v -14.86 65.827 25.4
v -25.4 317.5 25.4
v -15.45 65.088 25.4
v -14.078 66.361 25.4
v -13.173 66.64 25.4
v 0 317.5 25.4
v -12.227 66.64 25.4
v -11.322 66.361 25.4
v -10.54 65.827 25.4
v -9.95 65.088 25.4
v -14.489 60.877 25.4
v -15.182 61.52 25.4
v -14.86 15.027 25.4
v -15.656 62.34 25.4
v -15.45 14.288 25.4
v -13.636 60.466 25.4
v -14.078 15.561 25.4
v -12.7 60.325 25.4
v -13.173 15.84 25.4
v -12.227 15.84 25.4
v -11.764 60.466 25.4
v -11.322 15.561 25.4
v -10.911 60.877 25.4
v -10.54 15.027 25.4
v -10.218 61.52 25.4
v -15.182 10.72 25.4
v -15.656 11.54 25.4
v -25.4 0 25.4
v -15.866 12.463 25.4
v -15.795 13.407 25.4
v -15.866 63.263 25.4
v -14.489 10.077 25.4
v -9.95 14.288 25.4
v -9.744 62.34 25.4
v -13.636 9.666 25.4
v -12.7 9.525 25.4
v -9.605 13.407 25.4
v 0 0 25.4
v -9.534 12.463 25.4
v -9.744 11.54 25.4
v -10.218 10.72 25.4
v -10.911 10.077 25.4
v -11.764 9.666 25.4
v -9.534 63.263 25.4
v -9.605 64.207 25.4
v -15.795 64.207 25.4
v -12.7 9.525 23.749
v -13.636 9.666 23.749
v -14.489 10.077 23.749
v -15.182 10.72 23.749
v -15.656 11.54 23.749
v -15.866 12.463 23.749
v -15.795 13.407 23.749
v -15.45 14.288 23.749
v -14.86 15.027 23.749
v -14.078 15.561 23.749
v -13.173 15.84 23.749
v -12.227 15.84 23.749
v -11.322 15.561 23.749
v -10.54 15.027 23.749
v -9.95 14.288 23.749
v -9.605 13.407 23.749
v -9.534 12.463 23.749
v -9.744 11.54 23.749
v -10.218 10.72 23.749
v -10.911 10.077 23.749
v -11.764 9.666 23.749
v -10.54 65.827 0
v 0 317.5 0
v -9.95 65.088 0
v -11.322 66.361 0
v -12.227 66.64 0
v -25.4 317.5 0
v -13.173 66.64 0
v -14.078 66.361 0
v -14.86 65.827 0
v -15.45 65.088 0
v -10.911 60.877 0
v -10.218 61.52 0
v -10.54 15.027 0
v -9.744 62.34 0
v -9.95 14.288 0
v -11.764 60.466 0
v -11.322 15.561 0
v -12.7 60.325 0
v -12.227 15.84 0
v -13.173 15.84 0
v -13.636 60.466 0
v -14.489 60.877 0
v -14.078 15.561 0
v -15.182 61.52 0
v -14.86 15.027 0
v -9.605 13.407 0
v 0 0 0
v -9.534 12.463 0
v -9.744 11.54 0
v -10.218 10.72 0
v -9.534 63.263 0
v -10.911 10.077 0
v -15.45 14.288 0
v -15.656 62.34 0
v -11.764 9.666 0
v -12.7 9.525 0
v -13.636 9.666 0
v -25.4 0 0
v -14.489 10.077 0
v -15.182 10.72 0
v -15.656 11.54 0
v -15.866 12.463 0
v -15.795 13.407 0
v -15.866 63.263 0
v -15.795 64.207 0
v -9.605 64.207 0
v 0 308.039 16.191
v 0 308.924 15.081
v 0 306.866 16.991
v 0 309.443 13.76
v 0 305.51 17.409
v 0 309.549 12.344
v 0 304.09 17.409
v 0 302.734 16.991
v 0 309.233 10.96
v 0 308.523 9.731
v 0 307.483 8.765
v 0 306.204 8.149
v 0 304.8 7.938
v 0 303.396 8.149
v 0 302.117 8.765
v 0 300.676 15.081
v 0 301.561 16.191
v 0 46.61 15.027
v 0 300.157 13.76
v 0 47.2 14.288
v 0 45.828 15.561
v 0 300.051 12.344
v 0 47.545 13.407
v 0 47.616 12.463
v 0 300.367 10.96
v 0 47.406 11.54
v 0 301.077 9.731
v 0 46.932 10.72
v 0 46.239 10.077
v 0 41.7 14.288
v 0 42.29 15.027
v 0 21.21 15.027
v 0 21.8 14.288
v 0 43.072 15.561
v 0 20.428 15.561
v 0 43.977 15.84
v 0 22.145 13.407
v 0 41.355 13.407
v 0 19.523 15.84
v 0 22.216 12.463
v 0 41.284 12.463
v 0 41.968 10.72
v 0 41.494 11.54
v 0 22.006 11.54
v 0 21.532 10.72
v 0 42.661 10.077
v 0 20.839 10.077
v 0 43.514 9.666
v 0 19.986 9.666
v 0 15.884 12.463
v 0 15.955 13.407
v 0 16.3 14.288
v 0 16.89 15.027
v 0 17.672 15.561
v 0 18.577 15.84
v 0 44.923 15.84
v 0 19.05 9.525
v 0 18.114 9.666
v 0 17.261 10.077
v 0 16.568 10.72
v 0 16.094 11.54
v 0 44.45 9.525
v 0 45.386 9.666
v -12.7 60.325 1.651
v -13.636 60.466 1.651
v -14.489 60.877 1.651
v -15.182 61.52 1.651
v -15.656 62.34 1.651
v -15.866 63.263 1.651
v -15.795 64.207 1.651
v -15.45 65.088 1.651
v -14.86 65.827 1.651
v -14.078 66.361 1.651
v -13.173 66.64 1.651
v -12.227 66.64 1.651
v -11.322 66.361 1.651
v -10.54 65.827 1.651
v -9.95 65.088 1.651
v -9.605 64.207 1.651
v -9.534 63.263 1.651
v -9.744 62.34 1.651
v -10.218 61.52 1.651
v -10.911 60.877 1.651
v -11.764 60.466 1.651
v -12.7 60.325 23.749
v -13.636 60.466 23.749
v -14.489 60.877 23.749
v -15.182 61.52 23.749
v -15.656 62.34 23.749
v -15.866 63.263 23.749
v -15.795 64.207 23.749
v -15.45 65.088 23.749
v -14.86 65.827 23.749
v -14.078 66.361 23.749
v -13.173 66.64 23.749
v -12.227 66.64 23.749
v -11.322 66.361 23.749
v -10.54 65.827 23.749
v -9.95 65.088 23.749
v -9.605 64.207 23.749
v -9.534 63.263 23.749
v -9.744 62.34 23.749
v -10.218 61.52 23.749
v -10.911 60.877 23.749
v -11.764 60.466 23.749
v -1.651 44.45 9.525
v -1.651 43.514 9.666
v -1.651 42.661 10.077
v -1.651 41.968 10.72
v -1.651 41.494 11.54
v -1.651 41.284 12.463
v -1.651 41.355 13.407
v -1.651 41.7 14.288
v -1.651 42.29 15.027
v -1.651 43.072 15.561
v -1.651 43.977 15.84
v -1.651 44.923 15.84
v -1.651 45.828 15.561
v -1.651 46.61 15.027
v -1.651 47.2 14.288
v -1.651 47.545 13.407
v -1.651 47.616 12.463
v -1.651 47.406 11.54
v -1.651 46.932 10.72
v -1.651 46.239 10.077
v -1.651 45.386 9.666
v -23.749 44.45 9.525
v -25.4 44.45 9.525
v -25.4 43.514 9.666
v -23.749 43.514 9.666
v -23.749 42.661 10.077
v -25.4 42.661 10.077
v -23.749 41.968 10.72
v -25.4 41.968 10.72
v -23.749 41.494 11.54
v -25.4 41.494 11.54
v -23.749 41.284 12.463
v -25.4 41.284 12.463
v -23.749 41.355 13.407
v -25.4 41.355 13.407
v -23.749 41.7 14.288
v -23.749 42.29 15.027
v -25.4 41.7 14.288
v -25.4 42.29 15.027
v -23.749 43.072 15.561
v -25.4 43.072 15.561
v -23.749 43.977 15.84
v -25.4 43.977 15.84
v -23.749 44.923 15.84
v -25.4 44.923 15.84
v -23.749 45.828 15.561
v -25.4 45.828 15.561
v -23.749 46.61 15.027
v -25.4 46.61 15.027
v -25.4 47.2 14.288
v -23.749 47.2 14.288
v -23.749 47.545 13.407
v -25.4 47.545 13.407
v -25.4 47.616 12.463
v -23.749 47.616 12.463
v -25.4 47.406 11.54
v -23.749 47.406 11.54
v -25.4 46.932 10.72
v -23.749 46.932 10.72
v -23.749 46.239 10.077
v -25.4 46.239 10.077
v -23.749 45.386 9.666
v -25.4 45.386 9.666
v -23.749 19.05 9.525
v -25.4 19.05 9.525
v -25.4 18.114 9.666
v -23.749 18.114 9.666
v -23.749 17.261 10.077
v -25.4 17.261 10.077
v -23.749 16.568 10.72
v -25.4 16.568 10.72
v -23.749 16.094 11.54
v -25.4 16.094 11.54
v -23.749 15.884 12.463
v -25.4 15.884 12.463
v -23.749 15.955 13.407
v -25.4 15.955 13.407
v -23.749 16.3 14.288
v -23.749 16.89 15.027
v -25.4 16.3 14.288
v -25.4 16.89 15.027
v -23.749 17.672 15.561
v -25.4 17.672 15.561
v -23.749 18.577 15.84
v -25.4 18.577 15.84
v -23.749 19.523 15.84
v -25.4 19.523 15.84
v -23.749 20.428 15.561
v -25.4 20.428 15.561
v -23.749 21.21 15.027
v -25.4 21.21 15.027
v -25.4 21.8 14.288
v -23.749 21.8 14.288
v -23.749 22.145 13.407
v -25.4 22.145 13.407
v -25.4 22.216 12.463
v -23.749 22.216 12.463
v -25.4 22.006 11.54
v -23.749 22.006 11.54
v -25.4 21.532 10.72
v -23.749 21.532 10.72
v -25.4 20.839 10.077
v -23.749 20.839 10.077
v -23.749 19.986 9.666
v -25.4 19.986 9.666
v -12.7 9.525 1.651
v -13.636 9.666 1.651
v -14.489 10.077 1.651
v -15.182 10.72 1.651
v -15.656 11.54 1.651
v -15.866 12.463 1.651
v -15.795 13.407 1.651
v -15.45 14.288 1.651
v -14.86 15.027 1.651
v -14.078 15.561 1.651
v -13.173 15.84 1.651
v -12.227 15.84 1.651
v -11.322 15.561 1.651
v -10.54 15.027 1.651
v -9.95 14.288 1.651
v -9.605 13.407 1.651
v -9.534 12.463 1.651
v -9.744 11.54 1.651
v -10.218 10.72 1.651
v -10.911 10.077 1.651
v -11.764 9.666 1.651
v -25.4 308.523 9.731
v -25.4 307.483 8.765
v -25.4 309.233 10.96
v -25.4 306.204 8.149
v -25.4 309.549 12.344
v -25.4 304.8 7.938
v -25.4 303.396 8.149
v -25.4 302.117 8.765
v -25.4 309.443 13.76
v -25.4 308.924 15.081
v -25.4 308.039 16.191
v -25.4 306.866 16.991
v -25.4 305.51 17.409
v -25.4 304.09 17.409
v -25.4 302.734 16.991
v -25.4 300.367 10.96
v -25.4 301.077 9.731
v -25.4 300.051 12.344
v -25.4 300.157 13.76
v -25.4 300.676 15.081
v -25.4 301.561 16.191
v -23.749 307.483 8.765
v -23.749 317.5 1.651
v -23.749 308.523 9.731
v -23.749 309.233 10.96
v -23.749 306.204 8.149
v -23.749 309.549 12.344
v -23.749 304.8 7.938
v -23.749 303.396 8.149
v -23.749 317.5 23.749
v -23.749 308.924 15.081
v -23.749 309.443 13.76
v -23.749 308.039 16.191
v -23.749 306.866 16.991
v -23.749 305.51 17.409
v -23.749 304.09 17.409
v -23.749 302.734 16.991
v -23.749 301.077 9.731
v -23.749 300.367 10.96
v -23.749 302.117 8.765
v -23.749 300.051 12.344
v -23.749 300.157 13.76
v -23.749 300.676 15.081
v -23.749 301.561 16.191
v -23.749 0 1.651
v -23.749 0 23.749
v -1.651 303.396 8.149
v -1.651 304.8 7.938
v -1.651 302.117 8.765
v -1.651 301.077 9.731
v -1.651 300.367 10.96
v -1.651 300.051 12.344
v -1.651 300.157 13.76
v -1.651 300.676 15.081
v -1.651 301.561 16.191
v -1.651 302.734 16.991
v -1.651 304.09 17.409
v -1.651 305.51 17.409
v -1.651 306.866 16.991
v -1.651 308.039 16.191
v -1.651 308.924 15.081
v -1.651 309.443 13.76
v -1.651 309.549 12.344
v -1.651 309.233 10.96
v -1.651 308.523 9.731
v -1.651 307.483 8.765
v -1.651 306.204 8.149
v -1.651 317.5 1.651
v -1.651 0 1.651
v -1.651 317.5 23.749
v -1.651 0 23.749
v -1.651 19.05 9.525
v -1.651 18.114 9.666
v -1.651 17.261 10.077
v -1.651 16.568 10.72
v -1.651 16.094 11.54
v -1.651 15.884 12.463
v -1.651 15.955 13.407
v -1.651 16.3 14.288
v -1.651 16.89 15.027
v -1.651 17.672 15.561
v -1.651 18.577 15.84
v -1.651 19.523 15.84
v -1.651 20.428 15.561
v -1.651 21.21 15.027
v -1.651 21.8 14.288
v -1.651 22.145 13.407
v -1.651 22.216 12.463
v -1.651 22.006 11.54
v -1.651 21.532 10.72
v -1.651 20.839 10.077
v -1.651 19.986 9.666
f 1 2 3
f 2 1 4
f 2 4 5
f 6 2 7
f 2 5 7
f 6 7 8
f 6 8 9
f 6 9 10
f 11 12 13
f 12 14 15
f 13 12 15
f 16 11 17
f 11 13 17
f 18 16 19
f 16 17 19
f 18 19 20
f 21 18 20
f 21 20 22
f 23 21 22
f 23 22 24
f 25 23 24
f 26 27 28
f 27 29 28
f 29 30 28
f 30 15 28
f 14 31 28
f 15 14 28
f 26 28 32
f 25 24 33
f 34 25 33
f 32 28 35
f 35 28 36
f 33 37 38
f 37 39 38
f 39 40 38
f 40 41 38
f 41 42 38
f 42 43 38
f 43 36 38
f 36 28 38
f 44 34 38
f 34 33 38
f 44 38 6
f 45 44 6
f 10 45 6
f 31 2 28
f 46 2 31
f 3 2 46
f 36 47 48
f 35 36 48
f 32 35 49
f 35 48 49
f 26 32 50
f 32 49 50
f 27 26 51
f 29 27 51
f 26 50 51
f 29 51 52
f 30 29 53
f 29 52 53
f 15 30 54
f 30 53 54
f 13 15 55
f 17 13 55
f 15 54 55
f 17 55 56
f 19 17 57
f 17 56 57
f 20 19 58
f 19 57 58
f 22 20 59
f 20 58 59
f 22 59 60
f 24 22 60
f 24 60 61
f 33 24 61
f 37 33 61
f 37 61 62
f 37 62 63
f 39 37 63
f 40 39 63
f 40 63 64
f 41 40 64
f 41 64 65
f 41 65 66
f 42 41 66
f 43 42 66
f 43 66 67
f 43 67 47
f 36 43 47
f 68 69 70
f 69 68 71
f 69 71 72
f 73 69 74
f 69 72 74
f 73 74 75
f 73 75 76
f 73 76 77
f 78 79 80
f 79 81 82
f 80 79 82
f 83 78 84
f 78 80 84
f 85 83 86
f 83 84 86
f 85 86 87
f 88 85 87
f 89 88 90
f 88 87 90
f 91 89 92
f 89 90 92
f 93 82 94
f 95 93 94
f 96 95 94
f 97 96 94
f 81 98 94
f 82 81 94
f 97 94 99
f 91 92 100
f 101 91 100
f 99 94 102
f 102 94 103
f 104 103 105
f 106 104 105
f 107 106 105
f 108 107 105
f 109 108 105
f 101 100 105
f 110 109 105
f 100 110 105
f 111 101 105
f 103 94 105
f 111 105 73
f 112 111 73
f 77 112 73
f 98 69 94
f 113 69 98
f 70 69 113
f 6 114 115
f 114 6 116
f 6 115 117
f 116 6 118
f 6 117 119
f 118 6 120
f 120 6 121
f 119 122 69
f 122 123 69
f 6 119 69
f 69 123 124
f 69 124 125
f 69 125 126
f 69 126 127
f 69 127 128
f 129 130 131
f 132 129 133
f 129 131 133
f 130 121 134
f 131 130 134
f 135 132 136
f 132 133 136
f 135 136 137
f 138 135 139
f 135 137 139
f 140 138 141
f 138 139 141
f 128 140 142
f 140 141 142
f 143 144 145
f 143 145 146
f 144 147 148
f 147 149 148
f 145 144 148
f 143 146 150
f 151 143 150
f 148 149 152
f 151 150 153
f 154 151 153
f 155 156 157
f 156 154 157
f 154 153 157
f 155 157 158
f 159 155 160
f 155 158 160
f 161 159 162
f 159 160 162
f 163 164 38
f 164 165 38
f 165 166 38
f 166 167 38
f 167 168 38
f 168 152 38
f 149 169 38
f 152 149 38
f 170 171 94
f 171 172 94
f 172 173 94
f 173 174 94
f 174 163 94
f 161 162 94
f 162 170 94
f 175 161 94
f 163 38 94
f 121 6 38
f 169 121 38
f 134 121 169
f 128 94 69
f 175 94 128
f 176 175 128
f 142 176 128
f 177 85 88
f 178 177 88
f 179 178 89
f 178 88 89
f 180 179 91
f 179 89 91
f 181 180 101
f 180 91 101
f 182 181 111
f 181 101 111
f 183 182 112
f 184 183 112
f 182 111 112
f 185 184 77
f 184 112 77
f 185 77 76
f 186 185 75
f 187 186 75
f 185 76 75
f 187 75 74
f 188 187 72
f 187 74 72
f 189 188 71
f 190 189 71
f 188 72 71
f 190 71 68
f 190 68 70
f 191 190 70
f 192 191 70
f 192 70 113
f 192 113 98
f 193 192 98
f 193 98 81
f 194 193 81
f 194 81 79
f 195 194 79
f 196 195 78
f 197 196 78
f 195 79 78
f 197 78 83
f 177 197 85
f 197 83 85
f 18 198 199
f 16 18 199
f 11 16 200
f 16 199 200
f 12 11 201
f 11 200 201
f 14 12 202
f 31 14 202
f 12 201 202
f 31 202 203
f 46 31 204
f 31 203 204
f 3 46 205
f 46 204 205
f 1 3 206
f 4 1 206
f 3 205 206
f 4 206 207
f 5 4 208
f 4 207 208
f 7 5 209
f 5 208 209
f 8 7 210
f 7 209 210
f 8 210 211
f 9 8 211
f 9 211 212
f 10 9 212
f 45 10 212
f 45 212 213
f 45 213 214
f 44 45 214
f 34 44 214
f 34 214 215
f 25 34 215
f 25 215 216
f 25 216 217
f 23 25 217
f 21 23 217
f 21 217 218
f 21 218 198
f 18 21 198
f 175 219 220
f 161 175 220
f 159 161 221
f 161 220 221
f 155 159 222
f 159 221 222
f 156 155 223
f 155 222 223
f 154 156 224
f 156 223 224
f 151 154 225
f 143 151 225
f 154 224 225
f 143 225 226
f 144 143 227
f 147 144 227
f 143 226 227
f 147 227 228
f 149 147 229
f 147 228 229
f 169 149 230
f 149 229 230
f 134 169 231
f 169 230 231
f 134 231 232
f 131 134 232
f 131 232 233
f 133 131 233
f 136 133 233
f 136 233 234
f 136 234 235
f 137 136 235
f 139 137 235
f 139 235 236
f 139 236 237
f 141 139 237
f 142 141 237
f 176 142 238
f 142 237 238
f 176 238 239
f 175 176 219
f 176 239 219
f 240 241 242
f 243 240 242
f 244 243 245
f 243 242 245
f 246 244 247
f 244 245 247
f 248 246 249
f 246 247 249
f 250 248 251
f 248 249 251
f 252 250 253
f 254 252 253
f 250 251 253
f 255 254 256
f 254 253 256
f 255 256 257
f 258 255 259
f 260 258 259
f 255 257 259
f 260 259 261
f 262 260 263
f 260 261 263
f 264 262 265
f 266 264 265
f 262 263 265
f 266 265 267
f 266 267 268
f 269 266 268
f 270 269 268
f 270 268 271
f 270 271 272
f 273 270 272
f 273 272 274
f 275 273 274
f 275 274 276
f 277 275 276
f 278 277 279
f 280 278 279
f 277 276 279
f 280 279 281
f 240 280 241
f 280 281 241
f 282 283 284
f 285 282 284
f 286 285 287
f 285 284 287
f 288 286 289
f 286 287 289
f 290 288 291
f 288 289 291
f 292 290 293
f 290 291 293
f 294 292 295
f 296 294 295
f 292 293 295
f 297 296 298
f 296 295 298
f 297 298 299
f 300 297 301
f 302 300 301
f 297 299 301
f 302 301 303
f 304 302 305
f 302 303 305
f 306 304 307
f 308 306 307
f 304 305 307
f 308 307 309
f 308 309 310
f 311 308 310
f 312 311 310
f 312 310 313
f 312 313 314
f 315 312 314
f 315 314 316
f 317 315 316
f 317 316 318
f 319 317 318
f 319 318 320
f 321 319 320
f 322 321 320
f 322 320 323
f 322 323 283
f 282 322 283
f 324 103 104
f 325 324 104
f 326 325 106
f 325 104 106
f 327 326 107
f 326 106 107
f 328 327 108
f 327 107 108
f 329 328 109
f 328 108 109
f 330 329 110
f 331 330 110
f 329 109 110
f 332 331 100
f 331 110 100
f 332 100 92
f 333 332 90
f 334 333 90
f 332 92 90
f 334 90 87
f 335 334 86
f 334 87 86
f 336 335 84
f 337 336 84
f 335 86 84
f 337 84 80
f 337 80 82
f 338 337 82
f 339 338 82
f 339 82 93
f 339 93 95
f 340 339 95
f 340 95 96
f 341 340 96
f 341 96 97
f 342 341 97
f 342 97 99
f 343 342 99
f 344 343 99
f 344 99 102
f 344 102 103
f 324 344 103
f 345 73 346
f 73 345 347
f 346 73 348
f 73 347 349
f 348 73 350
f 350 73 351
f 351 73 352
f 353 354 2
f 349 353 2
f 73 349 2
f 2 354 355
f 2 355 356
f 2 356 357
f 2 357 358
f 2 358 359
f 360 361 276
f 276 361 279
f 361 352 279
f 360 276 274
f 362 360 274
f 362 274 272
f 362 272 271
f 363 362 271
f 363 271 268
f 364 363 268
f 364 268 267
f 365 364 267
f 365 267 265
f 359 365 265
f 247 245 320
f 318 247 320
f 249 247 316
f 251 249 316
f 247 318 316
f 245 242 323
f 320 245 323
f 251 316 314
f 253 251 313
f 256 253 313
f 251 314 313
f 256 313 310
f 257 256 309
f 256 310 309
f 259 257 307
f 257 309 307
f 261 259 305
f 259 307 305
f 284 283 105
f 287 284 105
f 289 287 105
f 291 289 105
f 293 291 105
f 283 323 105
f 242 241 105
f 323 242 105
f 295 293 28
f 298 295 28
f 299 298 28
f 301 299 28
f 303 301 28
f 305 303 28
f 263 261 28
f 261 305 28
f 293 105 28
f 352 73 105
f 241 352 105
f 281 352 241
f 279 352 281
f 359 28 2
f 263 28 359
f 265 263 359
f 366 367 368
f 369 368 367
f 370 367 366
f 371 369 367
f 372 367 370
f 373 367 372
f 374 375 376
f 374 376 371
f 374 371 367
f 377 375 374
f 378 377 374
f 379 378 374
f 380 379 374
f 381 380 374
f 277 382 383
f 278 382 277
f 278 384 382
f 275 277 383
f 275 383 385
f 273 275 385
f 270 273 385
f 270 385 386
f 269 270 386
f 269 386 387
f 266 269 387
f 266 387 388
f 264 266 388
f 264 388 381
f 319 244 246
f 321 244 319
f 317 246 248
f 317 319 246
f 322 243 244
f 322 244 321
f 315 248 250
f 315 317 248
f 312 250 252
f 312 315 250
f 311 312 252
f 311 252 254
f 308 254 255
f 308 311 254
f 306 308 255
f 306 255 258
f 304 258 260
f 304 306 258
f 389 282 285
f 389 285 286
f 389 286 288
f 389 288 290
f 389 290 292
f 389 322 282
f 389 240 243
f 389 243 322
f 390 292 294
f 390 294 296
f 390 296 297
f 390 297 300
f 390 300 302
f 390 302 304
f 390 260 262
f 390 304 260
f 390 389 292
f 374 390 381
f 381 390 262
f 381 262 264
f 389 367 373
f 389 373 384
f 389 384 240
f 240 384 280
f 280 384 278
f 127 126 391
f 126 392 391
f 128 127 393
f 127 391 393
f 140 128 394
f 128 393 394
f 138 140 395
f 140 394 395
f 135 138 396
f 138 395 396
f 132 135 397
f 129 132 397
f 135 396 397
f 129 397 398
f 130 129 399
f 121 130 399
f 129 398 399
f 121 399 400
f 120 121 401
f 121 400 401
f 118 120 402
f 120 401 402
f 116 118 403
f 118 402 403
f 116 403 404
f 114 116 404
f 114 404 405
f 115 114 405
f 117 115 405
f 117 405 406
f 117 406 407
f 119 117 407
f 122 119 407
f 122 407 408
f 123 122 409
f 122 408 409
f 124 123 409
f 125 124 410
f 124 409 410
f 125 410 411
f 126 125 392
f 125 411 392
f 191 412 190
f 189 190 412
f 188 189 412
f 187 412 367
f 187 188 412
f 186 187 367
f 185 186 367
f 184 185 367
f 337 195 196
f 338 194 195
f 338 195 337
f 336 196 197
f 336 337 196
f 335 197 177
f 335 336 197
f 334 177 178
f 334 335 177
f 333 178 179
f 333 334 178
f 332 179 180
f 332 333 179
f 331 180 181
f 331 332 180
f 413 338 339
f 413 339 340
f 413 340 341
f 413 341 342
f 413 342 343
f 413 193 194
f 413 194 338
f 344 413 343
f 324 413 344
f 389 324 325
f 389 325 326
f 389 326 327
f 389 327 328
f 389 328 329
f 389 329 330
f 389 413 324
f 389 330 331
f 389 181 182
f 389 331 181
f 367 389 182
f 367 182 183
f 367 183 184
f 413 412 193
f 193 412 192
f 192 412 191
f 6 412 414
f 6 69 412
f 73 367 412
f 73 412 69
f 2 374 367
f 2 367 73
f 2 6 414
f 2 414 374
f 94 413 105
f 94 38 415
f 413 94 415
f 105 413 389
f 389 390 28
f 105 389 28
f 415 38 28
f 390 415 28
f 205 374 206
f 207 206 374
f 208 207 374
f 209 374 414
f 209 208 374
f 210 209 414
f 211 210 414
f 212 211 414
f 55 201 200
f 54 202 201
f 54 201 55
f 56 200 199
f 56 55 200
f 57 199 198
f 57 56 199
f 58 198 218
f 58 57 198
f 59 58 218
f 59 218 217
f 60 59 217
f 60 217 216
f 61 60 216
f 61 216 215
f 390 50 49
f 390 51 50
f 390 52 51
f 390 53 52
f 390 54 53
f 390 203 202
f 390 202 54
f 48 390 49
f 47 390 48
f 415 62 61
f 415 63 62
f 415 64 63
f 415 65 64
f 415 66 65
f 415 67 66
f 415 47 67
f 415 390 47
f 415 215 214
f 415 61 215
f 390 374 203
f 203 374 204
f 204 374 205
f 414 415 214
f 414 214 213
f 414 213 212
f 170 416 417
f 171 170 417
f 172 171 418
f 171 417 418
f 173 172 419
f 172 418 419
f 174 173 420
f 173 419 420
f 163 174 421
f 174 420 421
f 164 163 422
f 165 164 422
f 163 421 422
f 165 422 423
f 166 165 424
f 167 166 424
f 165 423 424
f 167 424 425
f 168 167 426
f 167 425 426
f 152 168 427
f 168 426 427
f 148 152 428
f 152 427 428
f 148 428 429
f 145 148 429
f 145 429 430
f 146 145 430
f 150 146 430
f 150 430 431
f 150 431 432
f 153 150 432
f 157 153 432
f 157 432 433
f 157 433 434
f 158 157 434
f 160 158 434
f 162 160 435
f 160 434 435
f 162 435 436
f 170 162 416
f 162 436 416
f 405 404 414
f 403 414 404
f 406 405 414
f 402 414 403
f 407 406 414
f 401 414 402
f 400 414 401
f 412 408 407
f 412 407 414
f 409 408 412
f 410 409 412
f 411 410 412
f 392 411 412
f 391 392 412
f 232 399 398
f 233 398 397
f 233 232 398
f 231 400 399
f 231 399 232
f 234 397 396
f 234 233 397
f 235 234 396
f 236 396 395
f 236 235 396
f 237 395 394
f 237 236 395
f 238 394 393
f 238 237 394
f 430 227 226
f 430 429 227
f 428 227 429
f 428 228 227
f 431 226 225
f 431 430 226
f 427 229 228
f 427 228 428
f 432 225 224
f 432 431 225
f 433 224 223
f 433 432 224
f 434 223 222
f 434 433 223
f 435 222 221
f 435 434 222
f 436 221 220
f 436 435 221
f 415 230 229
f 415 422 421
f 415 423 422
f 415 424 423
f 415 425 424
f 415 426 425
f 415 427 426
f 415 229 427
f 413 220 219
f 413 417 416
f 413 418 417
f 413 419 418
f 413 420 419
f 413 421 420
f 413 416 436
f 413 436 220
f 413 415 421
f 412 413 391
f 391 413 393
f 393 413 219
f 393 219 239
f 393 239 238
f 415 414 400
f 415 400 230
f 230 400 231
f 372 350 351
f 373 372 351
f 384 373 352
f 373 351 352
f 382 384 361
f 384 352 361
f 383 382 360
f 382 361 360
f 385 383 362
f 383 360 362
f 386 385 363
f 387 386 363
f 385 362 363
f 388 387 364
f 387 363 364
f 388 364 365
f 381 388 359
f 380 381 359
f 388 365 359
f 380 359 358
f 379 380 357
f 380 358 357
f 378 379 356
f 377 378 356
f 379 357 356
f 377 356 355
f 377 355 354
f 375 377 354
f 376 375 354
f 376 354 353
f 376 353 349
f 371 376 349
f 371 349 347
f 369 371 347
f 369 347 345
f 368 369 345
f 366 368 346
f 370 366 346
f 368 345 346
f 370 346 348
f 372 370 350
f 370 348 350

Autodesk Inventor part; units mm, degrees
ref_plane "YZ Plane" through (0, 0, 0) normal (1, 0, 0) x (0, 1, 0)
ref_plane "XZ Plane" through (0, 0, 0) normal (0, 1, 0) x (-1, 0, 0)
ref_plane "XY Plane" through (0, 0, 0) normal (0, 0, 1) x (1, 0, 0)
sketch "Sketch1" plane through (0, 0, 0) normal (0, 1, 0) x (-1, 0, 0)
  line L0 (0, 0) -> (25.4, 0)
  line L1 (25.4, 0) -> (25.4, 25.4)
  line L2 (25.4, 25.4) -> (0, 25.4)
  line L3 (0, 25.4) -> (0, 0)
  line L4 (1.651, 1.651) -> (23.749, 1.651)
  line L5 (23.749, 1.651) -> (23.749, 23.749)
  line L6 (23.749, 23.749) -> (1.651, 23.749)
  line L7 (1.651, 23.749) -> (1.651, 1.651)
  dimension "d0" = 25.4
  dimension "d1" = 25.4
  dimension "d2" = 1.651
  dimension "d3" = 1.651
  dimension "d4" = 1.651
  dimension "d5" = 1.651
extrude "Extrusion1" add sketch "Sketch1" along normal blind 317.5
sketch "Sketch3" plane through (-25.4, 0, 25.4) normal (0, 0, 1) x (1, 0, 0)
  line L0 (0, 0) -> (25.4, 0) projected
  line L1 (25.4, 0) -> (25.4, 317.5) projected
  line L2 (0, 317.5) -> (25.4, 317.5) projected
  line L3 (0, 0) -> (0, 317.5) projected
sketch "Sketch4" plane through (-25.4, 0, 25.4) normal (0, 0, 1) x (1, 0, 0)
  line L0 (0, 0) -> (25.4, 0) projected
  line L1 (25.4, 0) -> (25.4, 317.5) projected
  point P0 (12.7, 12.7)
  point P1 (12.7, 63.5)
  dimension "d12" = 12.7
  dimension "d13" = 12.7
  dimension "d14" = 12.7
  dimension "d15" = 50.8
hole "Hole1" at (-12.7, 12.7, 25.4) direction (0, 0, -1) diameter 6.35 end through all
sketch "Sketch5" plane through (-25.4, 0, 25.4) normal (0, 0, 1) x (1, 0, 0)
  circle A0 centre (12.7, 12.7) radius 3.175 projected
  line L0 (25.4, 0) -> (25.4, 317.5) projected
  point P0 (12.7, 63.5)
  dimension "d23" = 12.7
  dimension "d24" = 50.8
hole "Hole2" at (-12.7, 63.5, 25.4) direction (0, 0, -1) diameter 6.35 end through all
sketch "Sketch6" plane through (0, 0, 25.4) normal (1, 0, 0) x (0, 0, -1)
  line L0 (0, 0) -> (25.4, 0) projected
  line L1 (25.4, 0) -> (25.4, 317.5) projected
  point P0 (12.7, 19.05)
  point P1 (12.7, 44.45)
  dimension "d32" = 12.7
  dimension "d33" = 12.7
  dimension "d34" = 19.05
  dimension "d35" = 25.4
hole "Hole3" at (0, 19.05, 12.7) at (0, 44.45, 12.7) direction (-1, 0, 0) diameter 6.35 end through all
sketch "Sketch7" plane through (0, 0, 25.4) normal (1, 0, 0) x (0, 0, -1)
  line L0 (0, 317.5) -> (25.4, 317.5) projected
  line L1 (0, 0) -> (0, 317.5) projected
  point P0 (12.7, 304.8)
  dimension "d43" = 12.7
  dimension "d44" = 12.7
hole "Hole4" at (0, 304.8, 12.7) direction (-1, 0, 0) diameter 9.525 end through all
properties part number "Front_Bar" material "Aluminum 6061"
